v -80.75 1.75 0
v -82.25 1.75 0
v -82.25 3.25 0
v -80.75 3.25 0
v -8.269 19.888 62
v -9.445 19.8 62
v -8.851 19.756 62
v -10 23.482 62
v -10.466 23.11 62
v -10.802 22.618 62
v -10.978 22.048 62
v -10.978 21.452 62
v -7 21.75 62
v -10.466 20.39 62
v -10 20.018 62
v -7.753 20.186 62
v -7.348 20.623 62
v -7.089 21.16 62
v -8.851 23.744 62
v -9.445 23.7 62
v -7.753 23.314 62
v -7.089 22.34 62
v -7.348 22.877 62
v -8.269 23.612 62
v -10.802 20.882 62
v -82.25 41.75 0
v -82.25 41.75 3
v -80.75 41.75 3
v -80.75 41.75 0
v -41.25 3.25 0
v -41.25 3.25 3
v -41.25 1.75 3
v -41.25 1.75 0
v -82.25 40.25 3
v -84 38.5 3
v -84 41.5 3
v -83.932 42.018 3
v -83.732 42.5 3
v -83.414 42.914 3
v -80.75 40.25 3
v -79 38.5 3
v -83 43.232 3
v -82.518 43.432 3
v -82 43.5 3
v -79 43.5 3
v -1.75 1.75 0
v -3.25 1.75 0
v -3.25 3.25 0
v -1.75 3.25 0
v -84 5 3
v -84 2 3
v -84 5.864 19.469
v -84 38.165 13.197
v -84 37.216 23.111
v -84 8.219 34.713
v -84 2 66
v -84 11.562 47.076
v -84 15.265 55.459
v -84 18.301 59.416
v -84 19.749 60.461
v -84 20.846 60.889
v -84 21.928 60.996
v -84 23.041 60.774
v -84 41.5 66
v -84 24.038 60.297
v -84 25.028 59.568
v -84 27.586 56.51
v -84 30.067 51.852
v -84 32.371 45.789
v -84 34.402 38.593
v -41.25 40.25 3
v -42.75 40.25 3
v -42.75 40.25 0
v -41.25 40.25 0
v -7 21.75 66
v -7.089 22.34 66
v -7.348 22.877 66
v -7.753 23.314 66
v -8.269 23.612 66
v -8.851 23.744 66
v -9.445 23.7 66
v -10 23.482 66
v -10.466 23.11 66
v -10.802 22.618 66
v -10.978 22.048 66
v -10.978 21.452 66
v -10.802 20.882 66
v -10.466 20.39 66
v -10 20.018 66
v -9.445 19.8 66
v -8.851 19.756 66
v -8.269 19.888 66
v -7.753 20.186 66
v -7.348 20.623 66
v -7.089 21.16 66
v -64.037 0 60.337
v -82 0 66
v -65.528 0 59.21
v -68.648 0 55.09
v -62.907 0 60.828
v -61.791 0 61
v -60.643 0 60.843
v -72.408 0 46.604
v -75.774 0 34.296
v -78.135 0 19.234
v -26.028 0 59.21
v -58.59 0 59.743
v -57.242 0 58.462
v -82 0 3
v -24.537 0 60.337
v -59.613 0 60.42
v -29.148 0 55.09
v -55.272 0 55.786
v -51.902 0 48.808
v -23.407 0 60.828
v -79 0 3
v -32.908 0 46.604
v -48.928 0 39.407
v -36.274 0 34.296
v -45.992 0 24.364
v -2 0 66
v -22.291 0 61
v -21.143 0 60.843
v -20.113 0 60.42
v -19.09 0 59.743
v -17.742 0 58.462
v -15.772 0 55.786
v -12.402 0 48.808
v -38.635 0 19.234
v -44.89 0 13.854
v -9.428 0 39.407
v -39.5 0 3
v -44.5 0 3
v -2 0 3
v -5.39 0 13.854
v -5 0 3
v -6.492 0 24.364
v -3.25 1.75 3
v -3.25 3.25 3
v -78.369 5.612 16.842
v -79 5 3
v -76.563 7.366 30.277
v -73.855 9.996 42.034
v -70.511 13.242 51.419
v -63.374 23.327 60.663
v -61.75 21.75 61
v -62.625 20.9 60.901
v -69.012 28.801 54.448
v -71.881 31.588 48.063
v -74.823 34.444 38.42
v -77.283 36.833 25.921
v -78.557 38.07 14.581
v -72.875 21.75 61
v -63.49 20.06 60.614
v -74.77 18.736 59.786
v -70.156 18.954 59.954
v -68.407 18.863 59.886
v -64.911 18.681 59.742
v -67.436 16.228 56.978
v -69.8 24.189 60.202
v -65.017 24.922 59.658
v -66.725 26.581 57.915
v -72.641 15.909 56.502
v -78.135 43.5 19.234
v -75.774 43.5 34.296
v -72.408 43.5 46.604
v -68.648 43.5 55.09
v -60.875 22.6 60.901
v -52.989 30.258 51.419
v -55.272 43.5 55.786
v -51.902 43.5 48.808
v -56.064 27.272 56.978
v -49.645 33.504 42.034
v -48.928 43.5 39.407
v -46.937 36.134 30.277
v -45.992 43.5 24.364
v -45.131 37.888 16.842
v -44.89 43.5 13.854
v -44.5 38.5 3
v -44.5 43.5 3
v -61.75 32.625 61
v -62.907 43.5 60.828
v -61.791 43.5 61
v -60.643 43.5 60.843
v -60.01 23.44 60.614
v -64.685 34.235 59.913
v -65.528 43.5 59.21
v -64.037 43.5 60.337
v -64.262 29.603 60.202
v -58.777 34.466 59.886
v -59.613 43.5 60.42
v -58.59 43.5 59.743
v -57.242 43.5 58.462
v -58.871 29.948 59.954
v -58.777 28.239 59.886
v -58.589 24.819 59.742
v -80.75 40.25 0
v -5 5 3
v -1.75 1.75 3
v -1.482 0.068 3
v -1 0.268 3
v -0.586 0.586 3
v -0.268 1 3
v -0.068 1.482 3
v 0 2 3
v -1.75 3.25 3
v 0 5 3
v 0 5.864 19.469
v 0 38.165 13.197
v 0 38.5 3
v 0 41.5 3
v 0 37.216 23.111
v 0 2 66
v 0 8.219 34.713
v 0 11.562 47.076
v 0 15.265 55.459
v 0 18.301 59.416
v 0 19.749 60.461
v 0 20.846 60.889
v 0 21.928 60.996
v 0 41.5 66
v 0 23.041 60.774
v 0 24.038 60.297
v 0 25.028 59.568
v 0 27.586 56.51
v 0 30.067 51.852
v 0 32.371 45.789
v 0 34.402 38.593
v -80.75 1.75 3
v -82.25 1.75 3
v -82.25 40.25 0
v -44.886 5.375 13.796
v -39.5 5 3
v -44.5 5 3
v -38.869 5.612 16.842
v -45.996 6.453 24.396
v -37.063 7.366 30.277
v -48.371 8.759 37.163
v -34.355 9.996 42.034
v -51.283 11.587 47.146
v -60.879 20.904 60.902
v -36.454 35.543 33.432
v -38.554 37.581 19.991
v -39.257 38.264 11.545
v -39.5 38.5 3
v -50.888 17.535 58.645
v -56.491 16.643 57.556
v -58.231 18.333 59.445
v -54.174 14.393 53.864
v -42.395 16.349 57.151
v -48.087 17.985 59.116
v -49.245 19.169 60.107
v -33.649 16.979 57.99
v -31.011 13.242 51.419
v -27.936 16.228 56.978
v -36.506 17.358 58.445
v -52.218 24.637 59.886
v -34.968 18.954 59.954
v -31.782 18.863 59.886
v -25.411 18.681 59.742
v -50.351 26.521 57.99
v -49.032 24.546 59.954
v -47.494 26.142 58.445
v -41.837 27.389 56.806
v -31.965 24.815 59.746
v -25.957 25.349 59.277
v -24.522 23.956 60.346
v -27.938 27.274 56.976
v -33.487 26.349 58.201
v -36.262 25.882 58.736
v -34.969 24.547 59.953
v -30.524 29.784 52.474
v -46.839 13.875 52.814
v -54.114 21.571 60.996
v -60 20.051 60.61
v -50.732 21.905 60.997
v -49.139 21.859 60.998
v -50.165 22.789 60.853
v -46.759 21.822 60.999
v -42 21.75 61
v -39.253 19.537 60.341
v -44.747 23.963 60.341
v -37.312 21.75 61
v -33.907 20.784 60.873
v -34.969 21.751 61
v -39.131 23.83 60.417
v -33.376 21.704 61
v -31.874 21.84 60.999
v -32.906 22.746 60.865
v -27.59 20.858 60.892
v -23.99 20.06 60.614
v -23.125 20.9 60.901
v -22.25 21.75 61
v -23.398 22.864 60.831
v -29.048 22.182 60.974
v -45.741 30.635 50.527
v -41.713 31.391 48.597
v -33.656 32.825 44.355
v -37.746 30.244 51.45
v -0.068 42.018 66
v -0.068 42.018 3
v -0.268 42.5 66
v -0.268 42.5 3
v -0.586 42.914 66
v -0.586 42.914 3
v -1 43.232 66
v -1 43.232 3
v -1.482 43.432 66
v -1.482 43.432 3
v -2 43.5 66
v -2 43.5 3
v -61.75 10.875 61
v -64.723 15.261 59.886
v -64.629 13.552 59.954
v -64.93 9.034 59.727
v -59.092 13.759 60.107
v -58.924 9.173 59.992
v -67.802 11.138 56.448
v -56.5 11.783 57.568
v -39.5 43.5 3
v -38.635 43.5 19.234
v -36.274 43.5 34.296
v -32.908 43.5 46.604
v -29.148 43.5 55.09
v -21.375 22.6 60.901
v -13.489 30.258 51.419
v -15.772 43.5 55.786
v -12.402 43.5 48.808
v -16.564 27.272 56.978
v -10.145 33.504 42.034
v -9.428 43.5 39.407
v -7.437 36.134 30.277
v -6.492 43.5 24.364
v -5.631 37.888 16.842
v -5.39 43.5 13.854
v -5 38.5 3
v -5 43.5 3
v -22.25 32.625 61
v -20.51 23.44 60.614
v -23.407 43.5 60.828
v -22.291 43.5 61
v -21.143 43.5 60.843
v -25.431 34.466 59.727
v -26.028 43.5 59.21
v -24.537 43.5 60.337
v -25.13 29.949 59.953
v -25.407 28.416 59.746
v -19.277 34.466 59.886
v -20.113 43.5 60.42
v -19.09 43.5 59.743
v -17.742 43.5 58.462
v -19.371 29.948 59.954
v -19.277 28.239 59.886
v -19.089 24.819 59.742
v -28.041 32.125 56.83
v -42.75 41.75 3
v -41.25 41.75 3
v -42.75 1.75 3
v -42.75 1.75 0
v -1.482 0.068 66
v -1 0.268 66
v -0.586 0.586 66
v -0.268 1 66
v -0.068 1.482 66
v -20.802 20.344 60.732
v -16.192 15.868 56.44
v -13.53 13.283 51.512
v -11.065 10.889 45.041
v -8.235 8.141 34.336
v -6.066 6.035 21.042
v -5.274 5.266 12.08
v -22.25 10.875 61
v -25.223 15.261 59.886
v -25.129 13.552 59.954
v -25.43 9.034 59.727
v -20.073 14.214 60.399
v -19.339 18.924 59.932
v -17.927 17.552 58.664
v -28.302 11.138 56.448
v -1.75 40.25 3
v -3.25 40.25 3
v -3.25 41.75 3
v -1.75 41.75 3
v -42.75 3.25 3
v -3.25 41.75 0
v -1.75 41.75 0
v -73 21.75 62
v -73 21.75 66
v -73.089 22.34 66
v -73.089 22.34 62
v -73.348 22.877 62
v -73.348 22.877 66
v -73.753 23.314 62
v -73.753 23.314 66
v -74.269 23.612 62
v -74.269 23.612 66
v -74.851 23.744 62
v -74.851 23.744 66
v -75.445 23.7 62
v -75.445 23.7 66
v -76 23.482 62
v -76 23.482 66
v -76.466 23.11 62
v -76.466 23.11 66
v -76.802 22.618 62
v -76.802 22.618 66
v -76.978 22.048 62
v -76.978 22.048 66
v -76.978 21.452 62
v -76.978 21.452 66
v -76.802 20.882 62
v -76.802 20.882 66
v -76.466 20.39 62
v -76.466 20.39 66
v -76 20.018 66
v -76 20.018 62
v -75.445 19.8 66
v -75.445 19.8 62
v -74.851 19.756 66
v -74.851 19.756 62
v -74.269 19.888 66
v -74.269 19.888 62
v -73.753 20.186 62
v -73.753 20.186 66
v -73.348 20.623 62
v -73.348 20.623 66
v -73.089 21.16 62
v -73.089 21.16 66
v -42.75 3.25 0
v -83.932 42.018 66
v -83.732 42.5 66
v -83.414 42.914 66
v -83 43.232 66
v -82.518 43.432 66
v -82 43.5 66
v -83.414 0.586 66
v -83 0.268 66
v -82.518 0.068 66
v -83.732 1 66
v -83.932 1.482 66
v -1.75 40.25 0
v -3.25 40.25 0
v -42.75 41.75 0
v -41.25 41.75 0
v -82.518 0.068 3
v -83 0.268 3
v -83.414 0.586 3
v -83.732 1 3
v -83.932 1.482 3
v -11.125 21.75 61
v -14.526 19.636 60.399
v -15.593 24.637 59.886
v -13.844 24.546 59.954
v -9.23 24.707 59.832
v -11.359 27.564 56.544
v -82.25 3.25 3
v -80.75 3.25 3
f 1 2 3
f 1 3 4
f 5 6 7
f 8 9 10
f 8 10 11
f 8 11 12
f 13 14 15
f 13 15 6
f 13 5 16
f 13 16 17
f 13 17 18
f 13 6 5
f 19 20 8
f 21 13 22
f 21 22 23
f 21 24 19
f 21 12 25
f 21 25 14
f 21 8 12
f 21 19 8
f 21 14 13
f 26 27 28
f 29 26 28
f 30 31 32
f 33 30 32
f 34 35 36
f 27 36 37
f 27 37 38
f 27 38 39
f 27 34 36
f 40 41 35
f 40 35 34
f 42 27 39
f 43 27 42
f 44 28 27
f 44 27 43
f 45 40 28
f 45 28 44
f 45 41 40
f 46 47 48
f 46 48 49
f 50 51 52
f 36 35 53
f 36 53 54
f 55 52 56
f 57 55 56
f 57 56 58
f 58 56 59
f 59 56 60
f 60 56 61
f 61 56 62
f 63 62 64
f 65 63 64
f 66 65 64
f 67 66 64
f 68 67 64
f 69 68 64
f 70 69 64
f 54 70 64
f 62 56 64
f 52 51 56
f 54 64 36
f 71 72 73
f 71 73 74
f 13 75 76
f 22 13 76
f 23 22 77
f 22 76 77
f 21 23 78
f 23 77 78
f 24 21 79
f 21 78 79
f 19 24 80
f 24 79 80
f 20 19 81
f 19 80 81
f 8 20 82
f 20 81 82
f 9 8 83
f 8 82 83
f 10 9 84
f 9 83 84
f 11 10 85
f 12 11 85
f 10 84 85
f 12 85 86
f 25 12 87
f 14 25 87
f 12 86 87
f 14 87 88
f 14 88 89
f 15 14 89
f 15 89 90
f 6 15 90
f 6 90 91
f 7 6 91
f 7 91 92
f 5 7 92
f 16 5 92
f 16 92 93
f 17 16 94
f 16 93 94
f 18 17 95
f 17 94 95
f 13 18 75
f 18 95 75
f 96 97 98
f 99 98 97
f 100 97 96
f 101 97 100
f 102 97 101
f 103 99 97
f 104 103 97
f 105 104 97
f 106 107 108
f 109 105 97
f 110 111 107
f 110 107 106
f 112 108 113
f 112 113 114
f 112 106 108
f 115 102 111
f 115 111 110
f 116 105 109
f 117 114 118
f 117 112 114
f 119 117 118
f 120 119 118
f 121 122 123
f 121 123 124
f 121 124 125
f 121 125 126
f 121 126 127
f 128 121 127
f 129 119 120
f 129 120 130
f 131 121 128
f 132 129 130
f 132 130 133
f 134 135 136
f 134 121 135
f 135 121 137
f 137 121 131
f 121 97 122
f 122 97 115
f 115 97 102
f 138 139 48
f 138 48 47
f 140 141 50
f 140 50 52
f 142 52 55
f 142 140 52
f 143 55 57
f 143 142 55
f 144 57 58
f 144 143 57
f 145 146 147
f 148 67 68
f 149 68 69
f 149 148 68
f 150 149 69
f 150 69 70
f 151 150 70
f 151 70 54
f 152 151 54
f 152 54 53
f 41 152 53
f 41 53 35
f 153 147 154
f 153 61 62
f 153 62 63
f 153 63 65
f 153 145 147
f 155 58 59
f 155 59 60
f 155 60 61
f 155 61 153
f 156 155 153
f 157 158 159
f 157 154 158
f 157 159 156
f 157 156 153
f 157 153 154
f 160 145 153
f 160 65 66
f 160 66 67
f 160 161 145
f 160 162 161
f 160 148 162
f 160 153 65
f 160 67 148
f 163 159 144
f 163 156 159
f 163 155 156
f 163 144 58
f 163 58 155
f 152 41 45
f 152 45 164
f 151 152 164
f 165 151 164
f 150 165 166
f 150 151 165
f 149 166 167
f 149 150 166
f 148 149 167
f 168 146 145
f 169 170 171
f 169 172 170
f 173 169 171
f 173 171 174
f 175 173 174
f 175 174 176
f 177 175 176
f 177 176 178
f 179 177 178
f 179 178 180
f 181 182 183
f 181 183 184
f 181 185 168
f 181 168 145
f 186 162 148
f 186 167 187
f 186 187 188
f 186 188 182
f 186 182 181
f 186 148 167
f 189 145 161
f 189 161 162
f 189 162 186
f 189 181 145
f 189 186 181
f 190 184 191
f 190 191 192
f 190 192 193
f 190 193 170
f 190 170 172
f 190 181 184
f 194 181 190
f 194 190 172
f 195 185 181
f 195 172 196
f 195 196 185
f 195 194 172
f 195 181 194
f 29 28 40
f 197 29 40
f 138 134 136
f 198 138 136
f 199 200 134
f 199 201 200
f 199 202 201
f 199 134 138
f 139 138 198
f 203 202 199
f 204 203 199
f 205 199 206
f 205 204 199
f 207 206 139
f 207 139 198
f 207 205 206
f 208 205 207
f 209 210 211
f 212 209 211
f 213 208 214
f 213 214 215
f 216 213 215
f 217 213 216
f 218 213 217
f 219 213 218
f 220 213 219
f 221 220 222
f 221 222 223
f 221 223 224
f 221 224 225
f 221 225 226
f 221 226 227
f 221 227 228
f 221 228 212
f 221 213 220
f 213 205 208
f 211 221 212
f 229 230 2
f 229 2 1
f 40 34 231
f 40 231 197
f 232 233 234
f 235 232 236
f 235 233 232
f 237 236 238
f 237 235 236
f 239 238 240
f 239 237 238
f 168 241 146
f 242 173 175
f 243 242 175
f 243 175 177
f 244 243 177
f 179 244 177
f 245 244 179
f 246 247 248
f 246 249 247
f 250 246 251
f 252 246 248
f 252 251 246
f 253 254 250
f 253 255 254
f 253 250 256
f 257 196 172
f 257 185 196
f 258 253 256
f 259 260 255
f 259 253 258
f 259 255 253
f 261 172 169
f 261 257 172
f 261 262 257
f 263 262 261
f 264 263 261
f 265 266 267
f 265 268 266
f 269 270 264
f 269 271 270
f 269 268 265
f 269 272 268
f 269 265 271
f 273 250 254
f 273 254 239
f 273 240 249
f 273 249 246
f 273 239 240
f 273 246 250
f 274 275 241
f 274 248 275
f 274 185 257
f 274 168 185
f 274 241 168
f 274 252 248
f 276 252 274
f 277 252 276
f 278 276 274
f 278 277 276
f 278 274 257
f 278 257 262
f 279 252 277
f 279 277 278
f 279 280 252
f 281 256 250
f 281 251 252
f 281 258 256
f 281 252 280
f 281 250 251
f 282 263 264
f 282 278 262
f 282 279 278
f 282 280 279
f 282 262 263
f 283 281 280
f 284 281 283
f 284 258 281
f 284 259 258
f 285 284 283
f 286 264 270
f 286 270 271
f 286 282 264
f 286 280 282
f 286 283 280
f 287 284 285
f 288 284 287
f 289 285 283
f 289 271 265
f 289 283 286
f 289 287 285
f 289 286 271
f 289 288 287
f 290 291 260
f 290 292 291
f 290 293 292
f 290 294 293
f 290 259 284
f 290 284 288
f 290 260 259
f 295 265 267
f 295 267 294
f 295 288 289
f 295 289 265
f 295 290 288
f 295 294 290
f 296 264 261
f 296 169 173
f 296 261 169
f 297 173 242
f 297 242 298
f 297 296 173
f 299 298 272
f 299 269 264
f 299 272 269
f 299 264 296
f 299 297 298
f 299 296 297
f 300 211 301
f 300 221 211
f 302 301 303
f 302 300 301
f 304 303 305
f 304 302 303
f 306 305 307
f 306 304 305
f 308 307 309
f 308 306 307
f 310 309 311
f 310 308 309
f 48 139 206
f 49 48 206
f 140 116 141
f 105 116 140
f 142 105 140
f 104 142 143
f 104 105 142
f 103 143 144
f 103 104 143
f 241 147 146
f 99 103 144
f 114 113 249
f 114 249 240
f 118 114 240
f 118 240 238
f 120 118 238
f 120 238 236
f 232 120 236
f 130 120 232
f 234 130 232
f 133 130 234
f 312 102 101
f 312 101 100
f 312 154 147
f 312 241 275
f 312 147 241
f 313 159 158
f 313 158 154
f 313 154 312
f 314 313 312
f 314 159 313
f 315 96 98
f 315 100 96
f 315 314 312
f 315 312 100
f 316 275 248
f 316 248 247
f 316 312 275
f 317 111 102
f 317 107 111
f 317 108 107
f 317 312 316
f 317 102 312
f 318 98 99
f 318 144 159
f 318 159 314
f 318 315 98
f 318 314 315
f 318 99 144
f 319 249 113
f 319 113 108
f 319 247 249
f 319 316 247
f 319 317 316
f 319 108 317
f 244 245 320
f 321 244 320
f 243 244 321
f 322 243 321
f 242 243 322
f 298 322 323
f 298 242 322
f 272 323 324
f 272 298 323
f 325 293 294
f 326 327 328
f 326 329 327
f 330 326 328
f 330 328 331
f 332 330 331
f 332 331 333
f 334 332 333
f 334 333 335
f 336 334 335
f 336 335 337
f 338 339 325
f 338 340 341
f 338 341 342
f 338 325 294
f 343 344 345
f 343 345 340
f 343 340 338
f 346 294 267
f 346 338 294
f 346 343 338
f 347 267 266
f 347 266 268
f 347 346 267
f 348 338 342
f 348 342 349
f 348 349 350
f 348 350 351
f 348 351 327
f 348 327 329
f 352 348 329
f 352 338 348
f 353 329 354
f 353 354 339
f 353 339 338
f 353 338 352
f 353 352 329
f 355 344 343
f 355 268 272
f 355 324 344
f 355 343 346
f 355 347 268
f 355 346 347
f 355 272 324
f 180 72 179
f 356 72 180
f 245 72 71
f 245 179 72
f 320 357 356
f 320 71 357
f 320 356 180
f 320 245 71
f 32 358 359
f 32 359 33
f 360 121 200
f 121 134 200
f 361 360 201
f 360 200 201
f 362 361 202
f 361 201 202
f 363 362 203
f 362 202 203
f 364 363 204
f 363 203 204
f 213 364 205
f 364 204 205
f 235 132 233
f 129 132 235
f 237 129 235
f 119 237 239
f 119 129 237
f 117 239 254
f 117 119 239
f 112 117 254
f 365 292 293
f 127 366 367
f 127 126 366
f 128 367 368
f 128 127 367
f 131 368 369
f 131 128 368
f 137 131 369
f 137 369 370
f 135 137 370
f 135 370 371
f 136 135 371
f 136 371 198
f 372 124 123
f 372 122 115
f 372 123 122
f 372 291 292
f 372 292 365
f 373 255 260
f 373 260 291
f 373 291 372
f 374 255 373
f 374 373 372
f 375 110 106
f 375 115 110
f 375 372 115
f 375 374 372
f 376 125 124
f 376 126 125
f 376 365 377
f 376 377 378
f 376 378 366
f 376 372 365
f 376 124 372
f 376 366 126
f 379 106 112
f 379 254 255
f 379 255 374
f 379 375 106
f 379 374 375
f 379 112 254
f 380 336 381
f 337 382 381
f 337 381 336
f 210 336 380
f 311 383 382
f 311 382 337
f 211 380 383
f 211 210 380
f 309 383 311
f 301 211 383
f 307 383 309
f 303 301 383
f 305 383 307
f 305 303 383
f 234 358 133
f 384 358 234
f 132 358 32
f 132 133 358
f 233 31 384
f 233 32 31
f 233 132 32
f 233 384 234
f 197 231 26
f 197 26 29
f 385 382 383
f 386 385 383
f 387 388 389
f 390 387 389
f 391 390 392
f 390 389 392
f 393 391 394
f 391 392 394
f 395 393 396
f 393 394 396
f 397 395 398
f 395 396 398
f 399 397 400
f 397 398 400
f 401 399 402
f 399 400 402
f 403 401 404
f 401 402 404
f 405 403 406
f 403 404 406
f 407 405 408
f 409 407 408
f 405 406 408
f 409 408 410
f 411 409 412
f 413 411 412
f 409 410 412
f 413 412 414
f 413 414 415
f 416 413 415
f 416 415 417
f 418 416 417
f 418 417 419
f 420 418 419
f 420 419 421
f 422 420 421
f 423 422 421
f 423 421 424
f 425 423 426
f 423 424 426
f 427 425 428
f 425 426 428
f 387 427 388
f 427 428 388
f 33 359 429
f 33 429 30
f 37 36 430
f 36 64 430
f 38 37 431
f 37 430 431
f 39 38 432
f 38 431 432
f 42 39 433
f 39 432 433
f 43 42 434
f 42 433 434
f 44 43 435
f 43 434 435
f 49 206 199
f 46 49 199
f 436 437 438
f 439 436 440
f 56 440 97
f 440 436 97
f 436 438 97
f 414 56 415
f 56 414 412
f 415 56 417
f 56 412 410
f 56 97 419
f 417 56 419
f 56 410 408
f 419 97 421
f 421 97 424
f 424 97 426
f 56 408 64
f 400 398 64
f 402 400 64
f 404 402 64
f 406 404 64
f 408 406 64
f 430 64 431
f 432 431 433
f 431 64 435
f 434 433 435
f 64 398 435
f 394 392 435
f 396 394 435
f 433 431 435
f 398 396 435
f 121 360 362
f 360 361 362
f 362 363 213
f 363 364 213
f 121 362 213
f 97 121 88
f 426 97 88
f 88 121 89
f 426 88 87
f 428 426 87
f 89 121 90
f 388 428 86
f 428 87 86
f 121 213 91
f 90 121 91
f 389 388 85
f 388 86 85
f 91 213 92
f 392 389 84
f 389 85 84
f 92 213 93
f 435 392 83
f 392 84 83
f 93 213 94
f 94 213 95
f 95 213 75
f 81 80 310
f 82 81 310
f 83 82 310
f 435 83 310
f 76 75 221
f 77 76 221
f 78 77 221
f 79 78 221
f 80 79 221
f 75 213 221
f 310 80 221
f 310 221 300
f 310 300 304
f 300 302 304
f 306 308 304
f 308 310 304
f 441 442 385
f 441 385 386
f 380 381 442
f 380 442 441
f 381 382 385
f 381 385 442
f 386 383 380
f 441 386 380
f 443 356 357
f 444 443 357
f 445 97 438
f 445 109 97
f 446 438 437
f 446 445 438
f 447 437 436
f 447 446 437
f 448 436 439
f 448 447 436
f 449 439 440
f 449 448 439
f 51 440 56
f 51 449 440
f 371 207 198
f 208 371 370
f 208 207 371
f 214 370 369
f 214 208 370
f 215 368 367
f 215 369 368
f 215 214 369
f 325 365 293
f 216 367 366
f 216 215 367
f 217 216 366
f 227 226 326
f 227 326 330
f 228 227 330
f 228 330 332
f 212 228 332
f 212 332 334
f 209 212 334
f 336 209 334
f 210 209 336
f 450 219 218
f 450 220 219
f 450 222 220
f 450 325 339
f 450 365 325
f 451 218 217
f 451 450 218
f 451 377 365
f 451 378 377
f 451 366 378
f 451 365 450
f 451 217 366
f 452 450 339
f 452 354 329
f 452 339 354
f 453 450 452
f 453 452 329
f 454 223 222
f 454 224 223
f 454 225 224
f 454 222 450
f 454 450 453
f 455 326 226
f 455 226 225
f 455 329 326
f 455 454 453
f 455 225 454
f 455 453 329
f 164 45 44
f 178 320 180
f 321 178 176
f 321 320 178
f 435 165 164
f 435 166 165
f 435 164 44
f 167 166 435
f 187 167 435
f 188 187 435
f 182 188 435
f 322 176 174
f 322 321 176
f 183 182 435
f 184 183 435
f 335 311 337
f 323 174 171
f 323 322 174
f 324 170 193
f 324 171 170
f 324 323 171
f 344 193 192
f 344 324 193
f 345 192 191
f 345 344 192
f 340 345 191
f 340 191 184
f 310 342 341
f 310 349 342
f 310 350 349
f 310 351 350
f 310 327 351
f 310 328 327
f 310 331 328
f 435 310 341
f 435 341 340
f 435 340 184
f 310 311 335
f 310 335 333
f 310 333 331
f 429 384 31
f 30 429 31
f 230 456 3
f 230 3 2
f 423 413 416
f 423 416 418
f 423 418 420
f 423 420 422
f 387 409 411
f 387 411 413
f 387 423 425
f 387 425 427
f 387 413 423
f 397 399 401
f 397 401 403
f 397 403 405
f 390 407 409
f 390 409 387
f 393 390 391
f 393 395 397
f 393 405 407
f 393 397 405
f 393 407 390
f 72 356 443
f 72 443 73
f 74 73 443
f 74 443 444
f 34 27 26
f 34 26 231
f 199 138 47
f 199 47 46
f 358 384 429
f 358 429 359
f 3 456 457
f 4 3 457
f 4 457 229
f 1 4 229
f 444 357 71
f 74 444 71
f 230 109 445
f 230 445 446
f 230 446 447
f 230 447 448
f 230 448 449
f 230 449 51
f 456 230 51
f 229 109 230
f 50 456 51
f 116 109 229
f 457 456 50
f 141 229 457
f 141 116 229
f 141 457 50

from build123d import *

# Parameters (mm, degrees)
F0_W      = 43.5
F0_H      = 3
F1_DEPTH  = 84
F3_DEPTH  = 84
F5_DEPTH  = 43.5
F6_R      = 2
F7_R      = 2
F8_DEPTH  = 4
F9_W      = 1.5
F9_H      = 1.5
F10_DEPTH = 3


# Not quite as in the source:
# - a feature names something its author has since deleted; it is built from what else it names


with BuildPart() as f1:
    # F0 (on Right) → F1 (new body)
    with BuildSketch(Plane.YZ):
        with Locations((21.75, 64.5)):
            Rectangle(F0_W, F0_H)
        Polygon((0, 63), (0, 3), (21, 3), (43.5, 3), (43.5, 63), align=None)
    extrude(amount=-F1_DEPTH)

    # F2 (on Right) → F3 (cut, through all)
    with BuildSketch(Plane.YZ):
        with BuildLine():
            add(Edge.make_bspline(
                [(4.9999998882, 3), (4.9999998882, 32.0000000559), (21.75, 90.0000001676), (38.5000001118, 32.0000000559), (38.5000001118, 3)],
                knots=[0, 0, 0, 0, 0.5, 1, 1, 1, 1], degree=3))
            Line((4.9999998882, 3), (38.5000001118, 3))
        make_face()
    extrude(amount=-F3_DEPTH, mode=Mode.SUBTRACT)

    # F4 (on Front) → F5 (cut, through all)
    with BuildSketch(Plane.XZ):
        with BuildLine():
            add(Edge.make_bspline(
                [(-79.0000001118, 3), (-79.0000001118, 32.0000000559), (-61.7500000559, 90.0000001676), (-44.5, 32.0000000559), (-44.5, 3)],
                knots=[0, 0, 0, 0, 0.5, 1, 1, 1, 1], degree=3))
            Line((-79.0000001118, 3), (-44.5, 3))
        make_face()
        with BuildLine():
            add(Edge.make_bspline(
                [(-39.5, 3), (-39.5, 32.0000000559), (-22.2499999441, 90.0000001676), (-4.9999998882, 32.0000000559), (-4.9999998882, 3)],
                knots=[0, 0, 0, 0, 0.5, 1, 1, 1, 1], degree=3))
            Line((-39.5, 3), (-4.9999998882, 3))
        make_face()
    extrude(amount=-F5_DEPTH, mode=Mode.SUBTRACT)

    # F6
    f6_edges = [f1.edges().sort_by_distance(p)[0] for p in [
        (0, 0, 34.5),
        (-84, 0, 34.5),
        (0, 43.5, 34.5),
        (-84, 43.5, 34.5),
    ]]
    fillet(f6_edges, radius=F6_R)

    # F7 (on face) → F8 (cut)
    with BuildSketch(Plane.XY.offset(66)):
        with Locations((-75, 21.75)):
            Circle(F7_R)
        with Locations((-9, 21.75)):
            Circle(F7_R)
    extrude(amount=-F8_DEPTH, mode=Mode.SUBTRACT)

    # F9 (on face) → F10 (join)
    with BuildSketch(Plane(origin=(0, 0, 3), x_dir=(1, 0, 0), z_dir=(0, 0, -1))):
        with Locations((-42, -2.4999999446)):
            Rectangle(F9_W, F9_H)
        with Locations((-2.4999999441, -2.4999999444)):
            Rectangle(F9_W, F9_H)
        with Locations((-2.4999999443, -41.0000000559)):
            Rectangle(F9_W, F9_H)
        with Locations((-42, -41.0000000564)):
            Rectangle(F9_W, F9_H)
        with Locations((-81.5000000559, -41.0000000561)):
            Rectangle(F9_W, F9_H)
        with Locations((-81.5000000562, -2.4999999441)):
            Rectangle(F9_W, F9_H)
    extrude(amount=F10_DEPTH)


solid = f1.part
